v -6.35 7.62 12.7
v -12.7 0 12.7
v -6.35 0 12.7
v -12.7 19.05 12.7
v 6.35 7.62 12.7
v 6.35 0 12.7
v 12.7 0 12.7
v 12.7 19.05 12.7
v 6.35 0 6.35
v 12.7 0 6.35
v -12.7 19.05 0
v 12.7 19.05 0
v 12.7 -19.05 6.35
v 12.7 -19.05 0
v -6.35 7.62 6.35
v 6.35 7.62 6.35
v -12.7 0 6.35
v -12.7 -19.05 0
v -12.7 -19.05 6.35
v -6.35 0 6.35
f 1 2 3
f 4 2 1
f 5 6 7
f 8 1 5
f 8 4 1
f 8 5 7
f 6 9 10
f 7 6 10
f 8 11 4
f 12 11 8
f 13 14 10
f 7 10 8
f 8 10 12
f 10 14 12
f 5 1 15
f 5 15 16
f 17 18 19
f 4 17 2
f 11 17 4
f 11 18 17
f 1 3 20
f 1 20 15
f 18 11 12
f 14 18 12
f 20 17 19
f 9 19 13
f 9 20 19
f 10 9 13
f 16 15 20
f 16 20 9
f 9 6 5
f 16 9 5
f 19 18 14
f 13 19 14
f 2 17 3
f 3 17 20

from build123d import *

# Parameters (mm, degrees)
F0_W     = 25.4
F0_H     = 38.1
F1_DEPTH = 6.35
F2_W     = 25.4
F2_H     = 19.05
F3_DEPTH = 6.35
F4_W     = 12.7
F4_H     = 15.24
F5_DEPTH = 6.35


with BuildPart() as f1:
    # F0 (on Top) → F1 (new body)
    with BuildSketch(Plane.XY):
        Rectangle(F0_W, F0_H)
    extrude(amount=F1_DEPTH)

    # F2 (on face) → F3 (join)
    with BuildSketch(Plane.XY.offset(6.35)):
        with Locations((0, 9.525)):
            Rectangle(F2_W, F2_H)
    extrude(amount=F3_DEPTH)

    # F4 (on face) → F5 (cut, symmetric)
    with BuildSketch(Plane.XY.offset(12.7)):
        Rectangle(F4_W, F4_H)
    extrude(amount=F5_DEPTH, both=True, mode=Mode.SUBTRACT)


solid = f1.part
